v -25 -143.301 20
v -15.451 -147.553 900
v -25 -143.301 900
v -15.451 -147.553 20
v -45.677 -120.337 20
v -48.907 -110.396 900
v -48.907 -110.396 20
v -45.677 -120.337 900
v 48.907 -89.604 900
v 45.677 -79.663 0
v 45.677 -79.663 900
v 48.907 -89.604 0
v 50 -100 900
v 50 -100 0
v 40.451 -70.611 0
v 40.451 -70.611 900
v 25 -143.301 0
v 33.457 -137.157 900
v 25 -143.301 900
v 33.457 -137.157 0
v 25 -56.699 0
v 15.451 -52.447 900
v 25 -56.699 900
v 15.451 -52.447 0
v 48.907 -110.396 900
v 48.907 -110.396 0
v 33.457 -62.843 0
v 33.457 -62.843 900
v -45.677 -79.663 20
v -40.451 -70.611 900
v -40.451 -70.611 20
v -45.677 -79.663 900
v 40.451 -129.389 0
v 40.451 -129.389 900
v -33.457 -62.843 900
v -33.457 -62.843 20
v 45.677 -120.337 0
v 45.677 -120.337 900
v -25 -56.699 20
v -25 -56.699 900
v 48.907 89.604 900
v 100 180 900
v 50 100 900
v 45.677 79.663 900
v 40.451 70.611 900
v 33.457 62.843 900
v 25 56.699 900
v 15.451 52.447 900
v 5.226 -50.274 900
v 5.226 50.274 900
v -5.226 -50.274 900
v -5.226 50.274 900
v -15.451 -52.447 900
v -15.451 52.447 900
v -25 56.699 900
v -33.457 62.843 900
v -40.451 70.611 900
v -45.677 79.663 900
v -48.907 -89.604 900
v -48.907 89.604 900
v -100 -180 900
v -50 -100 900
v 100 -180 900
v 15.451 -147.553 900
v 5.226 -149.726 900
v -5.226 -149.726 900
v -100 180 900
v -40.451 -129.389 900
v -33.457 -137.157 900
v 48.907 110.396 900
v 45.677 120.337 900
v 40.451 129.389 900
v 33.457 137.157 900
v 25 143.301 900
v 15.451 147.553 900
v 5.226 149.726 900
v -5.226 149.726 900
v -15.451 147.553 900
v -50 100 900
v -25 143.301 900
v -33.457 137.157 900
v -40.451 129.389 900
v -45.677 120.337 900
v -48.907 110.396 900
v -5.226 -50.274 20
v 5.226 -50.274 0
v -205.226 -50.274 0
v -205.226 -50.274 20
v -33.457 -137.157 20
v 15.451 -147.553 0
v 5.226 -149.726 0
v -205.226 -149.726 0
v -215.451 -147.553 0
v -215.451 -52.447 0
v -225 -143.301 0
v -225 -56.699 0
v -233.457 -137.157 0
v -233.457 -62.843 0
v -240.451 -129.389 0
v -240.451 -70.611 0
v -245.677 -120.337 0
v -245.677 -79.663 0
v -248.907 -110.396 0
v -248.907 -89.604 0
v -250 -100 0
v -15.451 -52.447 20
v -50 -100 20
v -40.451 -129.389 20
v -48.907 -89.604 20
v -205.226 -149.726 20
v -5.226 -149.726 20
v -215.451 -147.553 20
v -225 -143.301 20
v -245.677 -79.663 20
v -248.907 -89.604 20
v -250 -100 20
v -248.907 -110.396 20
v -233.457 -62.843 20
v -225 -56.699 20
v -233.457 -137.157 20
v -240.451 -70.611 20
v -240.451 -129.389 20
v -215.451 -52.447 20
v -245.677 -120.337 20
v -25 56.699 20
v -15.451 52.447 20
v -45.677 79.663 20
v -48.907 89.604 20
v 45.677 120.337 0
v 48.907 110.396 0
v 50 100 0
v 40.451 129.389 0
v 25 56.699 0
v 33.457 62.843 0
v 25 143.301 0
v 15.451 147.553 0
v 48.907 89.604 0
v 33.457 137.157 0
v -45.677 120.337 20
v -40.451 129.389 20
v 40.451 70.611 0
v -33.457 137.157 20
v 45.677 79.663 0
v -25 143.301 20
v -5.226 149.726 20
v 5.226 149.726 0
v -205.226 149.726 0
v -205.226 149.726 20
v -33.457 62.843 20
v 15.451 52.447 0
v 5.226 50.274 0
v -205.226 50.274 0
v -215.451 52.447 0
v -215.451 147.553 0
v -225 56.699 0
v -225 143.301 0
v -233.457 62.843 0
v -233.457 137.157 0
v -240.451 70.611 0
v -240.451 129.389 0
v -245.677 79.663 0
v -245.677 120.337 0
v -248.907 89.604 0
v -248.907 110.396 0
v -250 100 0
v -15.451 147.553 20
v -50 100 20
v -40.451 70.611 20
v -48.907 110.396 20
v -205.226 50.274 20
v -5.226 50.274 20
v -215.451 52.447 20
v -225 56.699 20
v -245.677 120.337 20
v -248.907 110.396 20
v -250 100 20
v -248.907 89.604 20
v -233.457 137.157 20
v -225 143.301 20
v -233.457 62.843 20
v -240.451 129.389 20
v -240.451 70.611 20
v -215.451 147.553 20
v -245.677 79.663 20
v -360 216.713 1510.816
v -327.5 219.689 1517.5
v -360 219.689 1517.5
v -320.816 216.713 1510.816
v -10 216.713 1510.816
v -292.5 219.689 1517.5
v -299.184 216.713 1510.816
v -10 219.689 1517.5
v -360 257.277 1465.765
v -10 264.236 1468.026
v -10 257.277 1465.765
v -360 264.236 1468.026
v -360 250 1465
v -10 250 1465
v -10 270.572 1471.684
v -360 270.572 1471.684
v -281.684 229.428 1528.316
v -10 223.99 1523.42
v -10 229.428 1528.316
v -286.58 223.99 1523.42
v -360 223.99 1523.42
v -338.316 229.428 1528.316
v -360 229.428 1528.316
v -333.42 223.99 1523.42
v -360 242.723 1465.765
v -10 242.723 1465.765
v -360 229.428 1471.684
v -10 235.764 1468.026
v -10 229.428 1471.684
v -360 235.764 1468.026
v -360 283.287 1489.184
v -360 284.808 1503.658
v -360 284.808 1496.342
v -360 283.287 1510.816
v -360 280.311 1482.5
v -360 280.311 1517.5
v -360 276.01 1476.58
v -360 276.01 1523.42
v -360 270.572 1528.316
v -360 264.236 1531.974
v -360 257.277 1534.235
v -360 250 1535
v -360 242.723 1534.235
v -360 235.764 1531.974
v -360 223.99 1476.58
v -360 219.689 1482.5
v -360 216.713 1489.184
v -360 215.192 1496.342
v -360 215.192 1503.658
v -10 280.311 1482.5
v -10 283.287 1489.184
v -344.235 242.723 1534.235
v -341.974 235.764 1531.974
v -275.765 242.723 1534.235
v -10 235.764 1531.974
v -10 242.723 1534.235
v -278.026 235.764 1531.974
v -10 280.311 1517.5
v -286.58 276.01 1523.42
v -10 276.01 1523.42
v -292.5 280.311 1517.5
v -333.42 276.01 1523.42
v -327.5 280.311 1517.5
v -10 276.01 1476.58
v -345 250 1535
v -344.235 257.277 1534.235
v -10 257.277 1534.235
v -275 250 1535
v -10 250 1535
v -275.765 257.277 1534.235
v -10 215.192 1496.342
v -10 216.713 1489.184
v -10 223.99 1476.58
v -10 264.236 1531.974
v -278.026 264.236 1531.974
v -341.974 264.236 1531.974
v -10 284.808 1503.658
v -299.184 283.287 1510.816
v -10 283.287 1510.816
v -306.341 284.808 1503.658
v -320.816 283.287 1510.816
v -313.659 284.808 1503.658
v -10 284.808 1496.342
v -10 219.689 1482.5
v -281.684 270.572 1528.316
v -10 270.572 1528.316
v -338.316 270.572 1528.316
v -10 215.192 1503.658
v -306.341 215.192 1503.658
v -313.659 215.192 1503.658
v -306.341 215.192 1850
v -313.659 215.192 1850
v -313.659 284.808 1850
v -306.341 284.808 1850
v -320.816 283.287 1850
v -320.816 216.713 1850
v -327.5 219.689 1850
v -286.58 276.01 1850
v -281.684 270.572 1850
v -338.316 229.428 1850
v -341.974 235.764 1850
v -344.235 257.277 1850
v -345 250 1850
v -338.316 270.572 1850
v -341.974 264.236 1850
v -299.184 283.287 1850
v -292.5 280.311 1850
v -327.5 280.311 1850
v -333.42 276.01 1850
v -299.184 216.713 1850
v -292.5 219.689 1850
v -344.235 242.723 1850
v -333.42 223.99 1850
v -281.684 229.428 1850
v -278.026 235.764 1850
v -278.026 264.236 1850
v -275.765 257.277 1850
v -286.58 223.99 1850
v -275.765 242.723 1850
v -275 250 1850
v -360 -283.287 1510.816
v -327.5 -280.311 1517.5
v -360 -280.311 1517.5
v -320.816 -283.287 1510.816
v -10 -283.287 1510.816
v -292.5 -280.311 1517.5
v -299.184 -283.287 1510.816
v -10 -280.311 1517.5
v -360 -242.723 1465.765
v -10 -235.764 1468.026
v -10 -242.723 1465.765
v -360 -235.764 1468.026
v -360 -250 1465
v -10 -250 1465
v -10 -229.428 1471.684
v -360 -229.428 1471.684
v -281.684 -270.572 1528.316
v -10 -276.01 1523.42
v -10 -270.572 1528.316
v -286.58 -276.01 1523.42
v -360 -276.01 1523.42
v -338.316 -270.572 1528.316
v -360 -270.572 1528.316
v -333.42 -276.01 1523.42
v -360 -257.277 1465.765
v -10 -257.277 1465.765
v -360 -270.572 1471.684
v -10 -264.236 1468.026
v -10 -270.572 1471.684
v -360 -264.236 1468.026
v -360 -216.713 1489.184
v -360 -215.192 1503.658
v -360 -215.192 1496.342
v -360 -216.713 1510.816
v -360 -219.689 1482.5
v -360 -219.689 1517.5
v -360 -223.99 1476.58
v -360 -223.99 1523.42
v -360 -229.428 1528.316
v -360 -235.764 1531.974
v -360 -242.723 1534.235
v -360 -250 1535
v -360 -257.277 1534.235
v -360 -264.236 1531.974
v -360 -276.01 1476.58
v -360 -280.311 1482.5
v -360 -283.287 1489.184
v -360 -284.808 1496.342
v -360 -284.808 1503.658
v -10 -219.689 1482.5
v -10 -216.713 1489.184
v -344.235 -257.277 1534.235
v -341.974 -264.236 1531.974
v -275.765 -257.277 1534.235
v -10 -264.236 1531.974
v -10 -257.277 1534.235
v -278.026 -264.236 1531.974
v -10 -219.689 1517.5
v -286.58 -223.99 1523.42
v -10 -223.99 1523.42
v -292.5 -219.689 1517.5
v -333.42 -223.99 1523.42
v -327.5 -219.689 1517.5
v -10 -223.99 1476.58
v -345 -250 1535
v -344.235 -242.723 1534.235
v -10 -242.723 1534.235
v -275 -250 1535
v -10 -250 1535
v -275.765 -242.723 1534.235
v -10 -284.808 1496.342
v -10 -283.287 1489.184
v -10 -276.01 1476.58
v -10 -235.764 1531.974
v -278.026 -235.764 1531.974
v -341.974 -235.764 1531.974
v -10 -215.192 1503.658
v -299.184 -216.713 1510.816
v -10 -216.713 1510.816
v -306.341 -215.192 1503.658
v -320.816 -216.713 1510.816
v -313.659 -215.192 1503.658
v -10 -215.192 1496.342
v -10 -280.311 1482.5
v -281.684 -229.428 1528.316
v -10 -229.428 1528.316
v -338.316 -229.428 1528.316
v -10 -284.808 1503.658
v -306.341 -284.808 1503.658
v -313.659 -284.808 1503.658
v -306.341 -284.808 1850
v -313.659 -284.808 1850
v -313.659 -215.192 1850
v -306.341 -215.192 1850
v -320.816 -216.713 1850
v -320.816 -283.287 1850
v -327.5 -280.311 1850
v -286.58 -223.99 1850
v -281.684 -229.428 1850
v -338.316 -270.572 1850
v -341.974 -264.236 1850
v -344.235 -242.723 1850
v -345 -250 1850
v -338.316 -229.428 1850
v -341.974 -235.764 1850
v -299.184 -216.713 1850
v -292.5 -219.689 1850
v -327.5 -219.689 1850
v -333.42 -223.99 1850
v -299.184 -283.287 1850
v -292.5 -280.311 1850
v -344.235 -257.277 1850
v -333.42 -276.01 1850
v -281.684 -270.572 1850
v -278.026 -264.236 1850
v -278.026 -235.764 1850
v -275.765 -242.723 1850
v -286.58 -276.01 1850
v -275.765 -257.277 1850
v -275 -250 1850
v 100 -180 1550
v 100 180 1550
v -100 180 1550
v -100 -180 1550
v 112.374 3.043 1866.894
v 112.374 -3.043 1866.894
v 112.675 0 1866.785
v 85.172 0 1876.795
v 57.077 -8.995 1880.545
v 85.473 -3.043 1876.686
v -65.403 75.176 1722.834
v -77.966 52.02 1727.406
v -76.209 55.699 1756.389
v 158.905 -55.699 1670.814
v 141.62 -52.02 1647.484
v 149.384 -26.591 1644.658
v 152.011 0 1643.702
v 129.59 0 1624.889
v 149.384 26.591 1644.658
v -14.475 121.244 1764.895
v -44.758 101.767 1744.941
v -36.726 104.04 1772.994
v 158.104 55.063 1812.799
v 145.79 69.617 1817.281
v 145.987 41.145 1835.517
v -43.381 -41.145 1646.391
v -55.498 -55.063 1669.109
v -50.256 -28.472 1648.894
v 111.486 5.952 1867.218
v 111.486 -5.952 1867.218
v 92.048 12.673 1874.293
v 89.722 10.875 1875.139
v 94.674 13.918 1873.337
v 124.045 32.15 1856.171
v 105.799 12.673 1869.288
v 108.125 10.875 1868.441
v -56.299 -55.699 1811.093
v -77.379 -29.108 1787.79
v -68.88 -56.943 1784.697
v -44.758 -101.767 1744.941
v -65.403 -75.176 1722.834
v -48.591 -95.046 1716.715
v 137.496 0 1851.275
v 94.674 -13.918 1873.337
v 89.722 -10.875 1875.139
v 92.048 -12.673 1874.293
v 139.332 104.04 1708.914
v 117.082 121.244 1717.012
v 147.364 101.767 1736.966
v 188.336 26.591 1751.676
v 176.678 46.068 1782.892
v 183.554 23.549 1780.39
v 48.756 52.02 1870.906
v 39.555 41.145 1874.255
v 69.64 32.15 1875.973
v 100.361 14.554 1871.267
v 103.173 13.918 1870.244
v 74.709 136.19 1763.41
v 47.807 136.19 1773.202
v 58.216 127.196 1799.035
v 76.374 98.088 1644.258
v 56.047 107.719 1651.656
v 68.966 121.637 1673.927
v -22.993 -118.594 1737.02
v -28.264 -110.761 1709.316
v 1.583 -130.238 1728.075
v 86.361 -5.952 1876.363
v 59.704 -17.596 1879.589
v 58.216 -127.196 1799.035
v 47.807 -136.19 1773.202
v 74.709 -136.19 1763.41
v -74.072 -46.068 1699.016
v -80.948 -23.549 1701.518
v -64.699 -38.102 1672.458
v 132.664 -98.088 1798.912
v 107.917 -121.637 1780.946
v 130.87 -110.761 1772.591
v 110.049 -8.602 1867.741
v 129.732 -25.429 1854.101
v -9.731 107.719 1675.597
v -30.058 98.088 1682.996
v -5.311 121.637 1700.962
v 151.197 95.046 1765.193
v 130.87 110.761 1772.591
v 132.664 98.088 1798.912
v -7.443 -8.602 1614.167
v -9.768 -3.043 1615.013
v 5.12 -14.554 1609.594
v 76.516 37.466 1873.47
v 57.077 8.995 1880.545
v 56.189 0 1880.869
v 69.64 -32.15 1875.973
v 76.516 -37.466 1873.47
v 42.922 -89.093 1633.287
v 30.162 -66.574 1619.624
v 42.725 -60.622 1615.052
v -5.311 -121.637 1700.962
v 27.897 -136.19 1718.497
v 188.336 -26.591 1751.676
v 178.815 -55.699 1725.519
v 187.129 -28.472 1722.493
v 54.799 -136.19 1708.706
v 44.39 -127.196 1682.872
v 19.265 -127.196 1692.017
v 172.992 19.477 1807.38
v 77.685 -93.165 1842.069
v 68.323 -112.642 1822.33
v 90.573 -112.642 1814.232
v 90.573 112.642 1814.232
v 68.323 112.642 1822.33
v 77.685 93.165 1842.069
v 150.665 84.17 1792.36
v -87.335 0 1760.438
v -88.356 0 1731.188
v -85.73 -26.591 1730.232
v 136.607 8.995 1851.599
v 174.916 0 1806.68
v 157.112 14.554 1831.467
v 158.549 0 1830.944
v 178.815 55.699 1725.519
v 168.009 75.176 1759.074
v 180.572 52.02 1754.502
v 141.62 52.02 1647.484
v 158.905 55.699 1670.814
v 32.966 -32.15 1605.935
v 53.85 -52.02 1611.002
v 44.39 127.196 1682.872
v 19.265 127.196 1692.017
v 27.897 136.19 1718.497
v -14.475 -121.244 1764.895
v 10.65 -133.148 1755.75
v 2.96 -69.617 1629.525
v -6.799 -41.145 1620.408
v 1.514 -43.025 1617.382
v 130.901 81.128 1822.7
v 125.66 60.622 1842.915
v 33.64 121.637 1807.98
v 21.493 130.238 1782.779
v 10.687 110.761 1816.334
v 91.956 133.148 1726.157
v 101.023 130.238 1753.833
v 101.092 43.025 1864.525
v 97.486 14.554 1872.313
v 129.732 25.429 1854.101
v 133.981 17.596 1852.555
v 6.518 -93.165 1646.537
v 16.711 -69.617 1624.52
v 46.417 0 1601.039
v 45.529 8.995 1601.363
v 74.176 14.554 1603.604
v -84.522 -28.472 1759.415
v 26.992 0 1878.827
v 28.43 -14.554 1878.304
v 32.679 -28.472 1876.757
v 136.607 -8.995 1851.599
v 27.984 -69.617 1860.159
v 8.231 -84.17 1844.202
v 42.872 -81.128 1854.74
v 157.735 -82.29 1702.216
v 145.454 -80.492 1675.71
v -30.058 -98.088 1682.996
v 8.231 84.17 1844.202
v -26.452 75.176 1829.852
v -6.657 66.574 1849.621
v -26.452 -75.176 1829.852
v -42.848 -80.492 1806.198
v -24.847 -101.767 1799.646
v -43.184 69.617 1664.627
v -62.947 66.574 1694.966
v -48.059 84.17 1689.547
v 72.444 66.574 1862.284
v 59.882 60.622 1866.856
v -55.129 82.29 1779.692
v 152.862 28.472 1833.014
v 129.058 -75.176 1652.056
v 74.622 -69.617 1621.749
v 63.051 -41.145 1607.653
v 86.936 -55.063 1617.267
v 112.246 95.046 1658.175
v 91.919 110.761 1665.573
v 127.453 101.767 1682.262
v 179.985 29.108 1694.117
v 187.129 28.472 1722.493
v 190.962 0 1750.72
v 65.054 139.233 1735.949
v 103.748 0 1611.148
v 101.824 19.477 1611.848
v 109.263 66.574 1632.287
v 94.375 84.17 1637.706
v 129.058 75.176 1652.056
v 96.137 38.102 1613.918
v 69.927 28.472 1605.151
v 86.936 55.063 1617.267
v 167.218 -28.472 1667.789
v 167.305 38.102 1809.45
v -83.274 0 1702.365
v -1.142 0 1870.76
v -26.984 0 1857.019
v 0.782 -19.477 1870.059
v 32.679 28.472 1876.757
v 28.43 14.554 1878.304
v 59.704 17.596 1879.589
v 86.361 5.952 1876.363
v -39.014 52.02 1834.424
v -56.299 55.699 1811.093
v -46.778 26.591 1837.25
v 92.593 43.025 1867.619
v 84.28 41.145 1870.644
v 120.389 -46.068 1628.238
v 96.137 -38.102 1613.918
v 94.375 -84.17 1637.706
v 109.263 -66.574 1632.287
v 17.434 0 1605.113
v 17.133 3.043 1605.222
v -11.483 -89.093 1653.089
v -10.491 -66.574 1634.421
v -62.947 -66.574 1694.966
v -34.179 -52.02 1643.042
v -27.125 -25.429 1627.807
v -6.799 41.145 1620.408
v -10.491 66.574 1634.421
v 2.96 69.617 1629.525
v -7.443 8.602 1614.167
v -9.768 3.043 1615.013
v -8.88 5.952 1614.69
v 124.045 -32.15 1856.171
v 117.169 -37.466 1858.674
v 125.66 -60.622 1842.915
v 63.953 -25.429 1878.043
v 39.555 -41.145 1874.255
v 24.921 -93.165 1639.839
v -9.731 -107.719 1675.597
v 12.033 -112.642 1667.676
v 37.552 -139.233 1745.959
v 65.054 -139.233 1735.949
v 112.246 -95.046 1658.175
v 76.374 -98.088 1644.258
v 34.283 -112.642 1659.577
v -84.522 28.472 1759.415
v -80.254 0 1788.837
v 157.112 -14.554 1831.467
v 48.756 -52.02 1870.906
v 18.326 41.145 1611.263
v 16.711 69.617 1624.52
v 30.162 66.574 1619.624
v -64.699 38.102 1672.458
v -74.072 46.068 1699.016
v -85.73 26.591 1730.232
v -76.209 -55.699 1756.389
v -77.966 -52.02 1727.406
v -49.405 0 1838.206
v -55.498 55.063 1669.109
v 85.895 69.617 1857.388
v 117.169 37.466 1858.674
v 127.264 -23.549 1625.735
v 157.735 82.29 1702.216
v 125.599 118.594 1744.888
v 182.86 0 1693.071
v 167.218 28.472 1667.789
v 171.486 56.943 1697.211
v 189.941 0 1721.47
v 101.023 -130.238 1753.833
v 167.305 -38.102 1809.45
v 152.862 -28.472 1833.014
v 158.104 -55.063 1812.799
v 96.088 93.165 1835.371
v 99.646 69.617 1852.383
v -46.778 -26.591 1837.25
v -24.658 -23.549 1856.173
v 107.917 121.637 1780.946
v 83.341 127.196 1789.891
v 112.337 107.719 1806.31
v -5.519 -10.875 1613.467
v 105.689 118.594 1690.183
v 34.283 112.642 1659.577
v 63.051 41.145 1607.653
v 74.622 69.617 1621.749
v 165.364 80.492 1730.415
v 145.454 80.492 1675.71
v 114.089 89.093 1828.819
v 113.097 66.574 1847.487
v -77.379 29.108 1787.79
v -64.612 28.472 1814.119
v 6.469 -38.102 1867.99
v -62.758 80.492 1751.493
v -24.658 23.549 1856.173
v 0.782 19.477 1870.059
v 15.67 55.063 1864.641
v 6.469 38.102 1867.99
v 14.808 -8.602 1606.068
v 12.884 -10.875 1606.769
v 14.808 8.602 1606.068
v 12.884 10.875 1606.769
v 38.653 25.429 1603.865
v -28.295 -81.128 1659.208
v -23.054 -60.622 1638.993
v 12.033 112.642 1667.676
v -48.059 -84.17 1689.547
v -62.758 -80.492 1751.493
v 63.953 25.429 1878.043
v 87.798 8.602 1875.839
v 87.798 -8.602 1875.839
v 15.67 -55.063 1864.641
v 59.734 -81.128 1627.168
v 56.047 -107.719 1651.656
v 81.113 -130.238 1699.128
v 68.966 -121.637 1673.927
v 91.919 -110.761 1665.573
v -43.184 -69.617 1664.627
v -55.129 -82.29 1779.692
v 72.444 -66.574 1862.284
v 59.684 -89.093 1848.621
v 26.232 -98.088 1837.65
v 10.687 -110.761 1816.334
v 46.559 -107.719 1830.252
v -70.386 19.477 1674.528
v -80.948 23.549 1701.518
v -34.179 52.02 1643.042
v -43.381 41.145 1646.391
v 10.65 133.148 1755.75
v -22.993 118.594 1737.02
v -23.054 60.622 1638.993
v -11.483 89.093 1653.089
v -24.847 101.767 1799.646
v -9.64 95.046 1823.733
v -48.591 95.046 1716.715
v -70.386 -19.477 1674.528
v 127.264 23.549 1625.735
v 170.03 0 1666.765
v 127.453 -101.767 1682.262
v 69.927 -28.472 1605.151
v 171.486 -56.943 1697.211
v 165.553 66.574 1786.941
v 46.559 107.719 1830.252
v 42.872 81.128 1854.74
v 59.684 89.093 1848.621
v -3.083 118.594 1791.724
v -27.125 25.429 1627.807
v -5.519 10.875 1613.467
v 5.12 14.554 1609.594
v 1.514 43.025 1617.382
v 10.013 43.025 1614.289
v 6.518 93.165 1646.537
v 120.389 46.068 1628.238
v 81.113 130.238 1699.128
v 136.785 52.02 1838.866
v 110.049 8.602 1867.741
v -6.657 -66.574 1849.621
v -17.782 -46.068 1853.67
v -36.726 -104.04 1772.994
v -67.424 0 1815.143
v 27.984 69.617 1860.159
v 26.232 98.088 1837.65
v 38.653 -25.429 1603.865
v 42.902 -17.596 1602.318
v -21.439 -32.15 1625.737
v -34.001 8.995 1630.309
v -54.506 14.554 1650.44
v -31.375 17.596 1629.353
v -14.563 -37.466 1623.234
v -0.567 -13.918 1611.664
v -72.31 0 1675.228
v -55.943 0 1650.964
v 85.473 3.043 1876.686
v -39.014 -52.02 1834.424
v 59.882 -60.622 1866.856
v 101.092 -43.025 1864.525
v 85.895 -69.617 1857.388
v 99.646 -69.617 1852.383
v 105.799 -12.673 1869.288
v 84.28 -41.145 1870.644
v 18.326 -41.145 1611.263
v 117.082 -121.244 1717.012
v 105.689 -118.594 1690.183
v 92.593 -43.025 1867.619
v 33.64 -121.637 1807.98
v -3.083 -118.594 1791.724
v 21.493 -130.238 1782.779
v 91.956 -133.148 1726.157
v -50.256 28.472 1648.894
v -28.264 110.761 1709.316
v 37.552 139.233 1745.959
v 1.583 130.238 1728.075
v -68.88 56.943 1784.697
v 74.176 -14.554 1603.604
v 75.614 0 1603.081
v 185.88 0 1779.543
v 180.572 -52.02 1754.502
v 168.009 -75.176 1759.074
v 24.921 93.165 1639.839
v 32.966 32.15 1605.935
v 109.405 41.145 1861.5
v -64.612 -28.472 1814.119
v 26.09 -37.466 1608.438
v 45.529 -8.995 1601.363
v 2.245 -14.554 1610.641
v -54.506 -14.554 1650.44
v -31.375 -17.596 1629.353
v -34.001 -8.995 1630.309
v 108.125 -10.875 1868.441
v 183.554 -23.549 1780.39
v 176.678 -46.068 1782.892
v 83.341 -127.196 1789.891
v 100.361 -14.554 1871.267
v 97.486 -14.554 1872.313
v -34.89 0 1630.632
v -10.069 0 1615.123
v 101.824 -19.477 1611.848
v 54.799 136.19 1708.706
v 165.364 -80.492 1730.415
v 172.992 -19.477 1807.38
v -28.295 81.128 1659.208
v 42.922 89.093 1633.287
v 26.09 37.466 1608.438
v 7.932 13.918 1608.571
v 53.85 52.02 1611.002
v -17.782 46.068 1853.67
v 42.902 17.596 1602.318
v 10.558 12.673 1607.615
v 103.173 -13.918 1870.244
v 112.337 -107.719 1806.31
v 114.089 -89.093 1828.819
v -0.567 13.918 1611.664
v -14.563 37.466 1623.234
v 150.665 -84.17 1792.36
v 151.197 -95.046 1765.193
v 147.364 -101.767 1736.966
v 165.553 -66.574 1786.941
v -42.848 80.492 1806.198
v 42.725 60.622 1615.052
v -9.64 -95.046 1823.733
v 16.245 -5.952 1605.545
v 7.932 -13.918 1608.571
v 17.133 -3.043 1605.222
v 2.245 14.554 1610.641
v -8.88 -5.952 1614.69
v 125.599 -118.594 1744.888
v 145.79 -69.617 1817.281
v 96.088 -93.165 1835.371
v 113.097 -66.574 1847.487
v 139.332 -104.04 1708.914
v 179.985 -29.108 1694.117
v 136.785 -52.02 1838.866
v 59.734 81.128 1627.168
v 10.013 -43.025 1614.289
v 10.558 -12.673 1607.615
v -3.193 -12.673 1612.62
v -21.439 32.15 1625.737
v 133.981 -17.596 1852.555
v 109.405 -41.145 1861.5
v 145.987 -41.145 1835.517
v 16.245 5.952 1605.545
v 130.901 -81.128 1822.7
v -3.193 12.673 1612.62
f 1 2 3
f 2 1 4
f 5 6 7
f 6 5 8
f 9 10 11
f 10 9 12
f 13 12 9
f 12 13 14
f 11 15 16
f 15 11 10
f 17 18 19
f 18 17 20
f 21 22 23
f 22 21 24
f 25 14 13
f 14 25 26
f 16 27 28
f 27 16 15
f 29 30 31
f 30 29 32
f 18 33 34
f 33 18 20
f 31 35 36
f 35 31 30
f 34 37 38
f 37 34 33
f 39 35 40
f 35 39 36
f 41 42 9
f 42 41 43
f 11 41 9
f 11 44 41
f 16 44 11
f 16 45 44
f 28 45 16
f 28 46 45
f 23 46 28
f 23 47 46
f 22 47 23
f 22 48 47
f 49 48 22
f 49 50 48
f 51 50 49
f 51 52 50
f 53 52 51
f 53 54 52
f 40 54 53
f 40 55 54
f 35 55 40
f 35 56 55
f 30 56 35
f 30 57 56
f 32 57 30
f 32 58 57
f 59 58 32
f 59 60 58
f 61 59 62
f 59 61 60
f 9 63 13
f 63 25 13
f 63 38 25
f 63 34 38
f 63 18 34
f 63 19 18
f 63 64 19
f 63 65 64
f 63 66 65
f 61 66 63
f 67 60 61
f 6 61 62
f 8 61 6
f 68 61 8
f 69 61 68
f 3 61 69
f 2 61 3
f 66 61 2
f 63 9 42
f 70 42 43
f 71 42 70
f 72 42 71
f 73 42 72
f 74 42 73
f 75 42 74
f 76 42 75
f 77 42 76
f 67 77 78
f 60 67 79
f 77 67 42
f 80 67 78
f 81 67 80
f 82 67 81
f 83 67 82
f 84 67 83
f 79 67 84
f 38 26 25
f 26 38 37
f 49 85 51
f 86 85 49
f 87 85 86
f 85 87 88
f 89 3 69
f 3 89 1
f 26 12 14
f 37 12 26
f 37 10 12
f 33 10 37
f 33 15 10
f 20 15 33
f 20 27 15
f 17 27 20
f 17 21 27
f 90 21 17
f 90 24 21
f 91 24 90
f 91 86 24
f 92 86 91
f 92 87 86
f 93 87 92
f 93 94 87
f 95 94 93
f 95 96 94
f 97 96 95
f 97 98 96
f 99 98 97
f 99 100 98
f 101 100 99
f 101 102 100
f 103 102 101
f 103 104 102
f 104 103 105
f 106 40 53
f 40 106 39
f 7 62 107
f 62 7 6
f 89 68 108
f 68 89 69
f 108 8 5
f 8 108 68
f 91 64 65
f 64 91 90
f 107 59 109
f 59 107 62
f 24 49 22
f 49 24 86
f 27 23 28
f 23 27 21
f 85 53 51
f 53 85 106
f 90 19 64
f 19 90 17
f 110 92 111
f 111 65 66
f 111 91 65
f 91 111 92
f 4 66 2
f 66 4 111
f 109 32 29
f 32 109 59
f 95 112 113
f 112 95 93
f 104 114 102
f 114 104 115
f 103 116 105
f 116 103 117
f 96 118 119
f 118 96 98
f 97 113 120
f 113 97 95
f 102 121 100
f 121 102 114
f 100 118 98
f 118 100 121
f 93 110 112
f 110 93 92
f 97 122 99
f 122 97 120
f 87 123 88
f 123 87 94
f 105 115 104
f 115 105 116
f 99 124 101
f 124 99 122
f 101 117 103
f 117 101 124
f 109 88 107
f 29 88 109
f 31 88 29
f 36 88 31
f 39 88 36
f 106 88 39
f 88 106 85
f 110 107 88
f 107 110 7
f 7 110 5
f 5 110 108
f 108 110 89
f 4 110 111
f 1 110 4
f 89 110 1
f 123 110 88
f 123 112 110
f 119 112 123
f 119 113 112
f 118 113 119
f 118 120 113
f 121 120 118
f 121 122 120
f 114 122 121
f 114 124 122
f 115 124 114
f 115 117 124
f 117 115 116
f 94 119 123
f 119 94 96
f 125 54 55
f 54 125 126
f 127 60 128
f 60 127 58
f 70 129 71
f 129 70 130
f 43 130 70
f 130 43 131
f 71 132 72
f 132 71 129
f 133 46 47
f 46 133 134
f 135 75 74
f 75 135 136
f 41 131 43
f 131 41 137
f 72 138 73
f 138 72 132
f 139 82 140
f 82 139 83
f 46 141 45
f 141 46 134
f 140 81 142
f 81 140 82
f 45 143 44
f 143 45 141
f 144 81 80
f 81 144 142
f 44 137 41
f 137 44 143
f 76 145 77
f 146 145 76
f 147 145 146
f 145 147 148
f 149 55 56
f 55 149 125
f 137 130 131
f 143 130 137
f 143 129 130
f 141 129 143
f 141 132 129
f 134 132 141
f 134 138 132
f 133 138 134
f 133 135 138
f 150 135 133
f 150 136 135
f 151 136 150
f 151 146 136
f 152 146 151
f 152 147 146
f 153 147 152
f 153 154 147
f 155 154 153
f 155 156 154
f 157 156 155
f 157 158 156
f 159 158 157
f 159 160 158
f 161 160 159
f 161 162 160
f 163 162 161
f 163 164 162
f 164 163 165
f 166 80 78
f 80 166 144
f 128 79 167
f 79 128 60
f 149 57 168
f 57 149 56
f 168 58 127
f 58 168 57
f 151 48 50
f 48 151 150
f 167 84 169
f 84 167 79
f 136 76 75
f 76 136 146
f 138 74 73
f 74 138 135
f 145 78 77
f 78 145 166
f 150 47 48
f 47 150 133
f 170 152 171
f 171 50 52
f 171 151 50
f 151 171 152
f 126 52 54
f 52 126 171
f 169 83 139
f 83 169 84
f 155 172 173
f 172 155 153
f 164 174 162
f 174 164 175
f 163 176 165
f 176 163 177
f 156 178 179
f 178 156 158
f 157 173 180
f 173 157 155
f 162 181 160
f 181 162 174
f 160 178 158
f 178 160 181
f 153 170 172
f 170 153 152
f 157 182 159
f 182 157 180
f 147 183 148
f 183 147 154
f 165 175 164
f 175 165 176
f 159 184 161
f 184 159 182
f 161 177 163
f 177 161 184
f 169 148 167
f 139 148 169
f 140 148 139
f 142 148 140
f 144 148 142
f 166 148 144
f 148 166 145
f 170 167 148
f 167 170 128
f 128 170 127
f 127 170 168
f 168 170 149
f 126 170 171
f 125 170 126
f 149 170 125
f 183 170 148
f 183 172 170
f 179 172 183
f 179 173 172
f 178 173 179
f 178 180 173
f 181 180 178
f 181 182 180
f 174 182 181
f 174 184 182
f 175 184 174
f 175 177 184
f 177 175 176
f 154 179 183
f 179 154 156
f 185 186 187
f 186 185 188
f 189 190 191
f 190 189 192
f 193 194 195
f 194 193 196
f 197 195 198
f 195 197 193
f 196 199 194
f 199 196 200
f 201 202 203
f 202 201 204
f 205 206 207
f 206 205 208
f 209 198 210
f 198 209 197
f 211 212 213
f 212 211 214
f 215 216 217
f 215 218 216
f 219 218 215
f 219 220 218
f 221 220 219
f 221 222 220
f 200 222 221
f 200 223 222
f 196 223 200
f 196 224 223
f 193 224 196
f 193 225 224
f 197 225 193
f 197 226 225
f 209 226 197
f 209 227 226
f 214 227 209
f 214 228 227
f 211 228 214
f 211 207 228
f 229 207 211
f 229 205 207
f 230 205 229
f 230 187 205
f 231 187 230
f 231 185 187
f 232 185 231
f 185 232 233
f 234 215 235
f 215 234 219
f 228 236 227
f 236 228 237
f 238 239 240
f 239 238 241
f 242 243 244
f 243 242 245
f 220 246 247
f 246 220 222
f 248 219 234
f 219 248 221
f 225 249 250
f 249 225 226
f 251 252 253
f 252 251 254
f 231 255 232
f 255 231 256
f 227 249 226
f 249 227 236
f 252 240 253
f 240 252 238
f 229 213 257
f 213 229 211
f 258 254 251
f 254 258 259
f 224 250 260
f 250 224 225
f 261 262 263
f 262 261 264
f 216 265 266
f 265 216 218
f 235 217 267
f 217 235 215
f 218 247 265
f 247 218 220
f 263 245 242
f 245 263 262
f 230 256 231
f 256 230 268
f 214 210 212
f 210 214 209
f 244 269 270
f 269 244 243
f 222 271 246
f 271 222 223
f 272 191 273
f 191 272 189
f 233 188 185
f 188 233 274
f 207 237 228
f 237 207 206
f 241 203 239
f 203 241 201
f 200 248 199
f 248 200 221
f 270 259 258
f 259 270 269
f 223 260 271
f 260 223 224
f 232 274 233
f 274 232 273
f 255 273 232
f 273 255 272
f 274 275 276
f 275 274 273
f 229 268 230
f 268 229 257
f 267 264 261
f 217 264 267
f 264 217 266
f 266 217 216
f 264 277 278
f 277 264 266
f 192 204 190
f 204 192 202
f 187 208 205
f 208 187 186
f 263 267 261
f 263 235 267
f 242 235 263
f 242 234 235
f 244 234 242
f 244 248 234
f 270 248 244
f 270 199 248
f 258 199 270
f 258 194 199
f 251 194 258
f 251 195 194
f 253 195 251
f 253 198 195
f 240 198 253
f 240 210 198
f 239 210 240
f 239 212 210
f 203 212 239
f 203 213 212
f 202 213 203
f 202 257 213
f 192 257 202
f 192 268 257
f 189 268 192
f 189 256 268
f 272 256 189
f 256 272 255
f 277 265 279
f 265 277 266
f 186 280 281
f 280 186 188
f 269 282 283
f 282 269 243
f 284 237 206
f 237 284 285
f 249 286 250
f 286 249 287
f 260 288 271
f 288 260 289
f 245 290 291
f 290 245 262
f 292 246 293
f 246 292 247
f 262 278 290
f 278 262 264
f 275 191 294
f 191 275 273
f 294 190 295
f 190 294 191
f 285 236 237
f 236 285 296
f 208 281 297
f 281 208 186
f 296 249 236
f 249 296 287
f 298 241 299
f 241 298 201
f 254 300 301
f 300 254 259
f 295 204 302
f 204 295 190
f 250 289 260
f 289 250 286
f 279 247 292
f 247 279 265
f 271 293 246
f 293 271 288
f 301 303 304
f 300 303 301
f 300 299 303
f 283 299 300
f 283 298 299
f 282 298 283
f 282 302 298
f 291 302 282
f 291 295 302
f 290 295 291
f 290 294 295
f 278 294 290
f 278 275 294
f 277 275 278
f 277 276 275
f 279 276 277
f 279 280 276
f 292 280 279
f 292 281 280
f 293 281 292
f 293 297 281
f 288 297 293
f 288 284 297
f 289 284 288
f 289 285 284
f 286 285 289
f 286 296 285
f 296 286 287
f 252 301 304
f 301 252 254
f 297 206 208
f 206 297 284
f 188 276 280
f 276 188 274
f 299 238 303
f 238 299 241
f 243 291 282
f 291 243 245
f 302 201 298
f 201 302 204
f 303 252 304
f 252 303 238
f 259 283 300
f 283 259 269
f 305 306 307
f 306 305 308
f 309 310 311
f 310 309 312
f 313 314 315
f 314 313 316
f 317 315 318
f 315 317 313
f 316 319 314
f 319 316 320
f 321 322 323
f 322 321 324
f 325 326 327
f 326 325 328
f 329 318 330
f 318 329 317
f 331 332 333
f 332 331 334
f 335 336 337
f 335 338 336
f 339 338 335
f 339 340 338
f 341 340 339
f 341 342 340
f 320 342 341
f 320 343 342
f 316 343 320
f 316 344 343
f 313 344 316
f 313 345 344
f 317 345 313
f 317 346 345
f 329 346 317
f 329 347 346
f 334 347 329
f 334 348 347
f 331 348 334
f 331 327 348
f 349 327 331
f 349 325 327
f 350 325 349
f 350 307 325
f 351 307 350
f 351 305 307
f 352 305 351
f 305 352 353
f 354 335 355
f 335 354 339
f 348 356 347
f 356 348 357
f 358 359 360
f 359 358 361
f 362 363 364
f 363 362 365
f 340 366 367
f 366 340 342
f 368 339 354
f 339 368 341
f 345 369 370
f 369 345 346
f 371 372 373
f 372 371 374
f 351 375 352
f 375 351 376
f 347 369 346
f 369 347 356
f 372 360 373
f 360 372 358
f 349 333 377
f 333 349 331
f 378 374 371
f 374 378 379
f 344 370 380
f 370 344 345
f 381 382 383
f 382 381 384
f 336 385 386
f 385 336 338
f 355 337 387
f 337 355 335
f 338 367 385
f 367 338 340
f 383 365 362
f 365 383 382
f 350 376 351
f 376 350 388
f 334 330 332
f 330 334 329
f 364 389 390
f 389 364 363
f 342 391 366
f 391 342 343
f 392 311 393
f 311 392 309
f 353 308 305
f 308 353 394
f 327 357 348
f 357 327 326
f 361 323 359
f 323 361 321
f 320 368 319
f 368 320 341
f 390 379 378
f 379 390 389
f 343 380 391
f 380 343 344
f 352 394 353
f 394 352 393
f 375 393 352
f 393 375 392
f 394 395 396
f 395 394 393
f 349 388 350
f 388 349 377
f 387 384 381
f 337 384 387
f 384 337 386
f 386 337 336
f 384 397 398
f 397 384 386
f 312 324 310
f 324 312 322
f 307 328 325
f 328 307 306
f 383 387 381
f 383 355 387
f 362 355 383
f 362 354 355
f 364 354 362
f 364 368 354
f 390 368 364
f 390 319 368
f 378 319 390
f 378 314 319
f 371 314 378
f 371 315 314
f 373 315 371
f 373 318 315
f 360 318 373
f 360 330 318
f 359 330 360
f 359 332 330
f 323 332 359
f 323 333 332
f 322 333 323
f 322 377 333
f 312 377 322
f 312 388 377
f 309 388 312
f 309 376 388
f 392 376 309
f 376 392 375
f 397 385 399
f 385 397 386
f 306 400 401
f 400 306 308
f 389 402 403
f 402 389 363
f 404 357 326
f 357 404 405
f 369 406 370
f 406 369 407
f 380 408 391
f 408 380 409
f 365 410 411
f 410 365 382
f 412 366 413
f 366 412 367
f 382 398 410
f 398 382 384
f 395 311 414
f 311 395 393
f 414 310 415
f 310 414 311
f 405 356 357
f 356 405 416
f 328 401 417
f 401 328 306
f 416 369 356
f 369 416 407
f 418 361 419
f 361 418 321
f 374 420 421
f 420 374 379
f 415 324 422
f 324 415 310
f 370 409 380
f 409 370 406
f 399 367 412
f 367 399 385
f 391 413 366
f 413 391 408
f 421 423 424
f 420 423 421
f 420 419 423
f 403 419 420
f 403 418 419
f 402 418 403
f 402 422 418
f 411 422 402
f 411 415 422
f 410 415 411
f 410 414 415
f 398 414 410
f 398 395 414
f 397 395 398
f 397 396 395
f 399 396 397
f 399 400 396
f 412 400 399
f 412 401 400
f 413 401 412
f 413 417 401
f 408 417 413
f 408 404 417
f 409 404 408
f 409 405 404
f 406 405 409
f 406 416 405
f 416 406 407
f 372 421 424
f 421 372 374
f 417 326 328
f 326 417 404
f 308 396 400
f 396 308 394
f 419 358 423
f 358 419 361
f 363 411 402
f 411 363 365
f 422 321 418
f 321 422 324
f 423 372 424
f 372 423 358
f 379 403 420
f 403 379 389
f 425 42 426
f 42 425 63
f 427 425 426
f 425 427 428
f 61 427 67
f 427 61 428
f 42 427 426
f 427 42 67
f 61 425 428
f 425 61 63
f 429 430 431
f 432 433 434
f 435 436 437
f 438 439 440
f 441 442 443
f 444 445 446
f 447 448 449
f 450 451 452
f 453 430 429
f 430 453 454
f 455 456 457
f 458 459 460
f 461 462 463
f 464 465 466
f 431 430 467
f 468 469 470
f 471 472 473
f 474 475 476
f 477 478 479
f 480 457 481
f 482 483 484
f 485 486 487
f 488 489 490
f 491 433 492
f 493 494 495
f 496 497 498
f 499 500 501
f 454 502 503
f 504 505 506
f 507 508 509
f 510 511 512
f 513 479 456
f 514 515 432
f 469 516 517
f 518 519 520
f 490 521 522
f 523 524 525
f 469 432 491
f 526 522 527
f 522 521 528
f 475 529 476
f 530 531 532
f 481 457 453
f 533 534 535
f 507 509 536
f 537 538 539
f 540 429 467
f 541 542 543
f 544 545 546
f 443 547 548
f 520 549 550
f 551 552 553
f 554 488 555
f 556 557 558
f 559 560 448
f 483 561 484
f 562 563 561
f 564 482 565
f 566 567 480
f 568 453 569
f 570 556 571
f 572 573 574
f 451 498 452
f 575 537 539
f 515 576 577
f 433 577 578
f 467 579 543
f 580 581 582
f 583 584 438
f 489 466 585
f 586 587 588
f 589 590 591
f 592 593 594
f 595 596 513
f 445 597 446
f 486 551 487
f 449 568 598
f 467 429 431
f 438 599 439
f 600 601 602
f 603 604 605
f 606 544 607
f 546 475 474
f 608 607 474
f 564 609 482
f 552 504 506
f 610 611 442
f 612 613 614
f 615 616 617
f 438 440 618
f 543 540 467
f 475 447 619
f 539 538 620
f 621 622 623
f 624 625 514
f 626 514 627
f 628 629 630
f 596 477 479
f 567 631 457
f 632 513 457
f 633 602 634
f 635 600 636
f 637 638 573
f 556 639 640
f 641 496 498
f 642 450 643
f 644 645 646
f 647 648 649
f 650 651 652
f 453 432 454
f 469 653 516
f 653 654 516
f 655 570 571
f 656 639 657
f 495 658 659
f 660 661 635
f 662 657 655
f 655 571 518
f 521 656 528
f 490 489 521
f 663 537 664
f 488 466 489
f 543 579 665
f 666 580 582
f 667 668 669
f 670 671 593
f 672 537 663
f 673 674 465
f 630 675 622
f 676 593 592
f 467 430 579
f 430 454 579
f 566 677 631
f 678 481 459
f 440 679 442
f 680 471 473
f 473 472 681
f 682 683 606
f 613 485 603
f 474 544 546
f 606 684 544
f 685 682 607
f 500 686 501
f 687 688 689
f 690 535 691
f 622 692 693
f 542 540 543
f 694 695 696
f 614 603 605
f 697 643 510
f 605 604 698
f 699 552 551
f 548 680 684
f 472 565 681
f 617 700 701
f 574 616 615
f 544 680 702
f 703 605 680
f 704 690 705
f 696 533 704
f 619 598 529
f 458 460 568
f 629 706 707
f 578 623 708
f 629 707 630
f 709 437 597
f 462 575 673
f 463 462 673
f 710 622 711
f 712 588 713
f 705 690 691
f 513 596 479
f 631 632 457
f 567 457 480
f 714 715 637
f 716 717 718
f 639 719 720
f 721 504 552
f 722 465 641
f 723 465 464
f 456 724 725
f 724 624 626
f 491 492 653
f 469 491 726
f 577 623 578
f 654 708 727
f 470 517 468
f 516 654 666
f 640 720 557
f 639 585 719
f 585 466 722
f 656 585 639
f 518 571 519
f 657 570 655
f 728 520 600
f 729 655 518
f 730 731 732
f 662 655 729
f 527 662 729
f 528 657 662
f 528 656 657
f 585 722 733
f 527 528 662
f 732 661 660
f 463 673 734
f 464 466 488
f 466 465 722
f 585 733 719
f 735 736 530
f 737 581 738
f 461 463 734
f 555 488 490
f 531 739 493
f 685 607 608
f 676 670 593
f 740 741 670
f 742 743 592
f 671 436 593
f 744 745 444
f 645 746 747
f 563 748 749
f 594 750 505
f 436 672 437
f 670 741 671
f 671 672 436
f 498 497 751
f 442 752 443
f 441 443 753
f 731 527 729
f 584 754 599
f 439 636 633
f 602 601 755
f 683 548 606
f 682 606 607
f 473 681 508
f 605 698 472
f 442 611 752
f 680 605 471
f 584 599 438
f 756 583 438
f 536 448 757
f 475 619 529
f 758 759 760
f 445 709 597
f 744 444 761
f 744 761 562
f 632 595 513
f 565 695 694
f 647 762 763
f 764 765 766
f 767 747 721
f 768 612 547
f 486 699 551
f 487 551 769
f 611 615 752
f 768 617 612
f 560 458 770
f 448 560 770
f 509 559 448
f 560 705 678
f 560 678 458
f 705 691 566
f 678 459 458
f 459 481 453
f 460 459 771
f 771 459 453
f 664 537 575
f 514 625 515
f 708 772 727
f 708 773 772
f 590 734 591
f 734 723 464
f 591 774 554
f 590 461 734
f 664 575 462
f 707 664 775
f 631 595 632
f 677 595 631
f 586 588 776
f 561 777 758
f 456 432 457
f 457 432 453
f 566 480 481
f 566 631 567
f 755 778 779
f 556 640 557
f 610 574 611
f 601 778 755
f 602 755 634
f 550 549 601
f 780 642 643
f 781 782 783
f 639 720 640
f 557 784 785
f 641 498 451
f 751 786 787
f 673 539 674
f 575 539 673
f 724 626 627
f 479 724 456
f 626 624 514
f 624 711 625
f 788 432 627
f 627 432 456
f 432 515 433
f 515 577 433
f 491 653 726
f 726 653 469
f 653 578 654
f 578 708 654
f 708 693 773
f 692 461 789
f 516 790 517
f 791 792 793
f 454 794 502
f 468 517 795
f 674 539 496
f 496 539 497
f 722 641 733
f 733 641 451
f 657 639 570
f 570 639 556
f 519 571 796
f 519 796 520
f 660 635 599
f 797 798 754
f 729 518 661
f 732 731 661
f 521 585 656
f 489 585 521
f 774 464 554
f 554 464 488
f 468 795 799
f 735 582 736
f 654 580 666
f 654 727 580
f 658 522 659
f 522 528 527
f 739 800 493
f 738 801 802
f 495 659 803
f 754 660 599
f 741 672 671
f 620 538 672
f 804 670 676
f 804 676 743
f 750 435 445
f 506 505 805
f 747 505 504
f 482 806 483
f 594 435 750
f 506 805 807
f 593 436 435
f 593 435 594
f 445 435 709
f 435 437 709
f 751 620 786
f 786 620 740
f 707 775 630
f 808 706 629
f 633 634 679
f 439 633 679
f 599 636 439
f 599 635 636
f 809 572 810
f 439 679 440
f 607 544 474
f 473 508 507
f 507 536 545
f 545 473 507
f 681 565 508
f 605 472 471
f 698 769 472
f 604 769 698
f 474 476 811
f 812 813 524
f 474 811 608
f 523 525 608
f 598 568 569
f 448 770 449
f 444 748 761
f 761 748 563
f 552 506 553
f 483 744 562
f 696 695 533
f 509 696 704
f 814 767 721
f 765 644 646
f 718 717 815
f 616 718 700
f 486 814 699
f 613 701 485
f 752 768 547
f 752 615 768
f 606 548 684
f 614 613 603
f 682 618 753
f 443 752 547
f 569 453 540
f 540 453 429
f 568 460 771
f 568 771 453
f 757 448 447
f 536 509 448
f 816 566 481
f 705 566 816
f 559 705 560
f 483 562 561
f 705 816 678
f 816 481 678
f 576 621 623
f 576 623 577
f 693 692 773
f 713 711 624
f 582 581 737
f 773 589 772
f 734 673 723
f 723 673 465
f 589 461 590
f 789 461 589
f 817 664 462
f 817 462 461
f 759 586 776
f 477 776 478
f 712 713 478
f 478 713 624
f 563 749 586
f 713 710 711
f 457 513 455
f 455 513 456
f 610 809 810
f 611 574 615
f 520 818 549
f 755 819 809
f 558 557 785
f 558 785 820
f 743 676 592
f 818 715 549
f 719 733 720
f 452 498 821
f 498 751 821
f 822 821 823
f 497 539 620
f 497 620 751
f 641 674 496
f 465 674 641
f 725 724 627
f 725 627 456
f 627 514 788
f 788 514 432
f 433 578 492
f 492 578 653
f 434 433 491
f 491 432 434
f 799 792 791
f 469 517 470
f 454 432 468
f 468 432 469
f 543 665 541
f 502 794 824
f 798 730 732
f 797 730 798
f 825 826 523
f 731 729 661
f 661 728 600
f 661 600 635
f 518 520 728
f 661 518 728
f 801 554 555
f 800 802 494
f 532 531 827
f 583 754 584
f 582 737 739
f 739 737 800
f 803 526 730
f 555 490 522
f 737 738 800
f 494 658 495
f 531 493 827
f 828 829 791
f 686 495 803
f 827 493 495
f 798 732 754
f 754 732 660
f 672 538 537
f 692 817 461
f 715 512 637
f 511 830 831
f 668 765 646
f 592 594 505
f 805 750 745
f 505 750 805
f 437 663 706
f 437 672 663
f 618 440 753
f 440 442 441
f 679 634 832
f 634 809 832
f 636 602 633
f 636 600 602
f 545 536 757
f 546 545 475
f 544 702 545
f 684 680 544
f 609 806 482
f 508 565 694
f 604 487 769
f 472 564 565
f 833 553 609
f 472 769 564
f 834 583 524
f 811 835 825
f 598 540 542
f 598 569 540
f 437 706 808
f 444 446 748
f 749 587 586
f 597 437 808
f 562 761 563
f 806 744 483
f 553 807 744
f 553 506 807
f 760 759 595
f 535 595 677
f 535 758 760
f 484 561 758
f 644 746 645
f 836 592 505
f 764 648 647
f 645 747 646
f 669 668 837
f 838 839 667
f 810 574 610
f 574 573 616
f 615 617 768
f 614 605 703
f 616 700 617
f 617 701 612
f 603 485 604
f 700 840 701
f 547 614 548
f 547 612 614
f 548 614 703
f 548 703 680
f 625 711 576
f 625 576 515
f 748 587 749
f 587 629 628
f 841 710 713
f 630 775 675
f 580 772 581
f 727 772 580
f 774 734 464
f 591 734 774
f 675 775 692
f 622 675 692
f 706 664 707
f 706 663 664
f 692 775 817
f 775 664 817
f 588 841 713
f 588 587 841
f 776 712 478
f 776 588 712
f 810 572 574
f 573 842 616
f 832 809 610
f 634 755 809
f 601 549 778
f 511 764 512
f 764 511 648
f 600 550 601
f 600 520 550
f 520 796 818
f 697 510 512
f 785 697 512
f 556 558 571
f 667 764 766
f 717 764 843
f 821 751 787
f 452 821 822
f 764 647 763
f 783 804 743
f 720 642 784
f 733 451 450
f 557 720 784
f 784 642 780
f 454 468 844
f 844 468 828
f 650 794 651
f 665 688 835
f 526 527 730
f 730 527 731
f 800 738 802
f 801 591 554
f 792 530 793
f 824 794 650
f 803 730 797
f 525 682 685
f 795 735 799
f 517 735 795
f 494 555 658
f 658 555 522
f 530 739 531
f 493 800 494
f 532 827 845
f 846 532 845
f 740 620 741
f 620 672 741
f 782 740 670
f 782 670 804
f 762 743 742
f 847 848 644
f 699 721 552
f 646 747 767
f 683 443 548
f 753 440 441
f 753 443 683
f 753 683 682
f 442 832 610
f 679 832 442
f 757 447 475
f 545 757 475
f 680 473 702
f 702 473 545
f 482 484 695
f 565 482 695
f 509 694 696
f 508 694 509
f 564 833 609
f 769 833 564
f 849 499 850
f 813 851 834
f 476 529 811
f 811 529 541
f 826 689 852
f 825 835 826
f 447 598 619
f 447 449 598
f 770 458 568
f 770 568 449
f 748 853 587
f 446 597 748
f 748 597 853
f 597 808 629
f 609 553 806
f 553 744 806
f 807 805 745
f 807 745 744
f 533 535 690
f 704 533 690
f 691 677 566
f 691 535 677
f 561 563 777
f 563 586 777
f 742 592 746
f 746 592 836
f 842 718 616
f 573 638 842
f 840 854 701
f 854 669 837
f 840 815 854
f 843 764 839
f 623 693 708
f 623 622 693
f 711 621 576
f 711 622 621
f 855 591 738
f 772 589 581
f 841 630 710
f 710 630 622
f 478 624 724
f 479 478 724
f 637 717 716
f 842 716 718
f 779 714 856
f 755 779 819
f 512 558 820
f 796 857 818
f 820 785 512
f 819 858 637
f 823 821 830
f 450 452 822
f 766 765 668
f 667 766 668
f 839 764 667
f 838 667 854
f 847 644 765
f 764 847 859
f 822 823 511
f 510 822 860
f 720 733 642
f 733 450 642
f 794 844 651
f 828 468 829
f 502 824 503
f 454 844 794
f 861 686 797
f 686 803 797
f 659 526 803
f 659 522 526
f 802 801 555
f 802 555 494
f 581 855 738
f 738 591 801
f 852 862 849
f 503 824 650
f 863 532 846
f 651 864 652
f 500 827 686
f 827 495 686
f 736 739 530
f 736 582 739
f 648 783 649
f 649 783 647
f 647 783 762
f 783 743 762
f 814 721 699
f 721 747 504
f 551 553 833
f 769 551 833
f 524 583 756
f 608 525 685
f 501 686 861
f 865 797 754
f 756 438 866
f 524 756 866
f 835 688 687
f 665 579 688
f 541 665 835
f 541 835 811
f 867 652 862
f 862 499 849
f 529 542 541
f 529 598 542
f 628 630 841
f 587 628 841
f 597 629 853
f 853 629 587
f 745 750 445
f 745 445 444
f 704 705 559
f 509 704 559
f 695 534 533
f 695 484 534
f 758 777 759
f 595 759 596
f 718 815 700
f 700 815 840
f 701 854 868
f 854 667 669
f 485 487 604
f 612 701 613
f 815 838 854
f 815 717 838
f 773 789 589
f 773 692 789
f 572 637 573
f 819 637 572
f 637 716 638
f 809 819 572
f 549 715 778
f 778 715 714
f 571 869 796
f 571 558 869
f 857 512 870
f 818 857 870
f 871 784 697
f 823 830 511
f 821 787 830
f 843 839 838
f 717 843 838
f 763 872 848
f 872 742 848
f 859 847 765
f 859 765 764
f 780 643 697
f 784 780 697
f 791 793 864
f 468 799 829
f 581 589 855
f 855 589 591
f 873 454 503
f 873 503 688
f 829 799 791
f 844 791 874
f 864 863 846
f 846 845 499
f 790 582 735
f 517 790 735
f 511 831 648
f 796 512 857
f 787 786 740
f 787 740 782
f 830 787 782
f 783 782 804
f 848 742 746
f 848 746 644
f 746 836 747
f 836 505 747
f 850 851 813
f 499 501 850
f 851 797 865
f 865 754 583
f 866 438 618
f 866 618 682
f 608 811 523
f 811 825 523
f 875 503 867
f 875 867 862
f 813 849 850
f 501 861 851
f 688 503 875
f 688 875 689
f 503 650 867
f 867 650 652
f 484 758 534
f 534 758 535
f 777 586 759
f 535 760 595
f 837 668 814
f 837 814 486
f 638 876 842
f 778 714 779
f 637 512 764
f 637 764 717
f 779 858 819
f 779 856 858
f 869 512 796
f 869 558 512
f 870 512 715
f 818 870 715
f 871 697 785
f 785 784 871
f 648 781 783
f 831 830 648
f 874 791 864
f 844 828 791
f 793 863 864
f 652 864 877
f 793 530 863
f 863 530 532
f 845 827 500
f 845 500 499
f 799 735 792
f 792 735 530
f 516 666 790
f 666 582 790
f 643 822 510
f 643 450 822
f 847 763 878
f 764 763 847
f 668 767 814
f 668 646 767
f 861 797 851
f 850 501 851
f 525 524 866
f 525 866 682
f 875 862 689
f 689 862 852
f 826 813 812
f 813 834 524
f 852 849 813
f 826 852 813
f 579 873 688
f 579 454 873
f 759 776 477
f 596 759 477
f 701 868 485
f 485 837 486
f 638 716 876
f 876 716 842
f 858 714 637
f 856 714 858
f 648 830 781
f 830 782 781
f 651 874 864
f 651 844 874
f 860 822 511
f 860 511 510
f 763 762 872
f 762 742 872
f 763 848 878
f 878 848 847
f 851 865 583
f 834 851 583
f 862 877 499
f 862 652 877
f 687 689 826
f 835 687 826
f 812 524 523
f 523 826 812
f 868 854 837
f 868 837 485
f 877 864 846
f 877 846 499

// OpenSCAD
// Solar-Bear
// A hybrid trike: powered by Sun and muscles!
// https://github.com/solar-b

// Maker: Mihai Oltean
// https://mihaioltean.github.io
// License: MIT

// last update 2026.07.01

//---------------------------------------------------------------------------------------
module human(hip_angle, shoulder_angle, elbow_angle, head_angle)
{
    color("blue"){
        // legs
        translate ([0, -100, 0]) {
            cylinder(h = 900, r = 50);
            hull(){
            // foot
                cylinder(h = 20, r = 50);
                translate([-200, 0, 0])
                    cylinder(h = 20, r = 50);
            }
        }
        translate ([0, 100, 0]) {
            cylinder(h = 900, r = 50);
            hull(){
                cylinder(h = 20, r = 50);
                translate([-200, 0, 0])
                    cylinder(h = 20, r = 50);
            }
        }
        // body
        translate ([-0, 0, 900]) 
            rotate([0, -(hip_angle), 0]) {
                translate ([-100, -180, 0]) 
                    cube([200, 360, 650]);
                    
// hands                
                translate ([-10, 250, 600]) 
                mirror([0, 0, 1])
                rotate([0, -shoulder_angle, 0]){
                    cylinder(h = 350, r = 35);
                    translate ([0, 0, 300]) 
                        rotate([0, -elbow_angle, 0])
                            cylinder(h = 350, r = 35);
                }
                // other hand
                translate ([-10, -250, 600]) 
                mirror([0, 0, 1])
                rotate([0, -shoulder_angle, 0]){
                    cylinder(h = 350, r = 35);
                    translate ([0, 0, 300]) 
                        rotate([0, -elbow_angle, 0])
                            cylinder(h = 350, r = 35);
                }
                /*
                translate ([-10, -220, 300]) 
                        translate ([0, 0, -300]) 
                            cylinder(h = 350, r = 35);
                        translate ([-10, -220, 00]) 
                            rotate([0, -elbow_angle, 0])
                            cylinder(h = 350, r = 35)
                            ;
                    }

                    translate ([-10, 220, 300]) 
                    cylinder(h = 350, r = 35);
                    
                translate ([-10, 220, 300]) 
                rotate([0, -elbow_angle, 0])
                    cylinder(h = 350, r = 35);
                    */
        // head
                
                translate ([0, 0, 700]) 
                    rotate([0, head_angle, 0])
                        translate ([0, 0, 150]) 
                            sphere(r = 140);
            }
    }
}
//---------------------------------------------------------------------------------------
human(hip_angle = 0, shoulder_angle = 90, elbow_angle = 90, head_angle = 20);
